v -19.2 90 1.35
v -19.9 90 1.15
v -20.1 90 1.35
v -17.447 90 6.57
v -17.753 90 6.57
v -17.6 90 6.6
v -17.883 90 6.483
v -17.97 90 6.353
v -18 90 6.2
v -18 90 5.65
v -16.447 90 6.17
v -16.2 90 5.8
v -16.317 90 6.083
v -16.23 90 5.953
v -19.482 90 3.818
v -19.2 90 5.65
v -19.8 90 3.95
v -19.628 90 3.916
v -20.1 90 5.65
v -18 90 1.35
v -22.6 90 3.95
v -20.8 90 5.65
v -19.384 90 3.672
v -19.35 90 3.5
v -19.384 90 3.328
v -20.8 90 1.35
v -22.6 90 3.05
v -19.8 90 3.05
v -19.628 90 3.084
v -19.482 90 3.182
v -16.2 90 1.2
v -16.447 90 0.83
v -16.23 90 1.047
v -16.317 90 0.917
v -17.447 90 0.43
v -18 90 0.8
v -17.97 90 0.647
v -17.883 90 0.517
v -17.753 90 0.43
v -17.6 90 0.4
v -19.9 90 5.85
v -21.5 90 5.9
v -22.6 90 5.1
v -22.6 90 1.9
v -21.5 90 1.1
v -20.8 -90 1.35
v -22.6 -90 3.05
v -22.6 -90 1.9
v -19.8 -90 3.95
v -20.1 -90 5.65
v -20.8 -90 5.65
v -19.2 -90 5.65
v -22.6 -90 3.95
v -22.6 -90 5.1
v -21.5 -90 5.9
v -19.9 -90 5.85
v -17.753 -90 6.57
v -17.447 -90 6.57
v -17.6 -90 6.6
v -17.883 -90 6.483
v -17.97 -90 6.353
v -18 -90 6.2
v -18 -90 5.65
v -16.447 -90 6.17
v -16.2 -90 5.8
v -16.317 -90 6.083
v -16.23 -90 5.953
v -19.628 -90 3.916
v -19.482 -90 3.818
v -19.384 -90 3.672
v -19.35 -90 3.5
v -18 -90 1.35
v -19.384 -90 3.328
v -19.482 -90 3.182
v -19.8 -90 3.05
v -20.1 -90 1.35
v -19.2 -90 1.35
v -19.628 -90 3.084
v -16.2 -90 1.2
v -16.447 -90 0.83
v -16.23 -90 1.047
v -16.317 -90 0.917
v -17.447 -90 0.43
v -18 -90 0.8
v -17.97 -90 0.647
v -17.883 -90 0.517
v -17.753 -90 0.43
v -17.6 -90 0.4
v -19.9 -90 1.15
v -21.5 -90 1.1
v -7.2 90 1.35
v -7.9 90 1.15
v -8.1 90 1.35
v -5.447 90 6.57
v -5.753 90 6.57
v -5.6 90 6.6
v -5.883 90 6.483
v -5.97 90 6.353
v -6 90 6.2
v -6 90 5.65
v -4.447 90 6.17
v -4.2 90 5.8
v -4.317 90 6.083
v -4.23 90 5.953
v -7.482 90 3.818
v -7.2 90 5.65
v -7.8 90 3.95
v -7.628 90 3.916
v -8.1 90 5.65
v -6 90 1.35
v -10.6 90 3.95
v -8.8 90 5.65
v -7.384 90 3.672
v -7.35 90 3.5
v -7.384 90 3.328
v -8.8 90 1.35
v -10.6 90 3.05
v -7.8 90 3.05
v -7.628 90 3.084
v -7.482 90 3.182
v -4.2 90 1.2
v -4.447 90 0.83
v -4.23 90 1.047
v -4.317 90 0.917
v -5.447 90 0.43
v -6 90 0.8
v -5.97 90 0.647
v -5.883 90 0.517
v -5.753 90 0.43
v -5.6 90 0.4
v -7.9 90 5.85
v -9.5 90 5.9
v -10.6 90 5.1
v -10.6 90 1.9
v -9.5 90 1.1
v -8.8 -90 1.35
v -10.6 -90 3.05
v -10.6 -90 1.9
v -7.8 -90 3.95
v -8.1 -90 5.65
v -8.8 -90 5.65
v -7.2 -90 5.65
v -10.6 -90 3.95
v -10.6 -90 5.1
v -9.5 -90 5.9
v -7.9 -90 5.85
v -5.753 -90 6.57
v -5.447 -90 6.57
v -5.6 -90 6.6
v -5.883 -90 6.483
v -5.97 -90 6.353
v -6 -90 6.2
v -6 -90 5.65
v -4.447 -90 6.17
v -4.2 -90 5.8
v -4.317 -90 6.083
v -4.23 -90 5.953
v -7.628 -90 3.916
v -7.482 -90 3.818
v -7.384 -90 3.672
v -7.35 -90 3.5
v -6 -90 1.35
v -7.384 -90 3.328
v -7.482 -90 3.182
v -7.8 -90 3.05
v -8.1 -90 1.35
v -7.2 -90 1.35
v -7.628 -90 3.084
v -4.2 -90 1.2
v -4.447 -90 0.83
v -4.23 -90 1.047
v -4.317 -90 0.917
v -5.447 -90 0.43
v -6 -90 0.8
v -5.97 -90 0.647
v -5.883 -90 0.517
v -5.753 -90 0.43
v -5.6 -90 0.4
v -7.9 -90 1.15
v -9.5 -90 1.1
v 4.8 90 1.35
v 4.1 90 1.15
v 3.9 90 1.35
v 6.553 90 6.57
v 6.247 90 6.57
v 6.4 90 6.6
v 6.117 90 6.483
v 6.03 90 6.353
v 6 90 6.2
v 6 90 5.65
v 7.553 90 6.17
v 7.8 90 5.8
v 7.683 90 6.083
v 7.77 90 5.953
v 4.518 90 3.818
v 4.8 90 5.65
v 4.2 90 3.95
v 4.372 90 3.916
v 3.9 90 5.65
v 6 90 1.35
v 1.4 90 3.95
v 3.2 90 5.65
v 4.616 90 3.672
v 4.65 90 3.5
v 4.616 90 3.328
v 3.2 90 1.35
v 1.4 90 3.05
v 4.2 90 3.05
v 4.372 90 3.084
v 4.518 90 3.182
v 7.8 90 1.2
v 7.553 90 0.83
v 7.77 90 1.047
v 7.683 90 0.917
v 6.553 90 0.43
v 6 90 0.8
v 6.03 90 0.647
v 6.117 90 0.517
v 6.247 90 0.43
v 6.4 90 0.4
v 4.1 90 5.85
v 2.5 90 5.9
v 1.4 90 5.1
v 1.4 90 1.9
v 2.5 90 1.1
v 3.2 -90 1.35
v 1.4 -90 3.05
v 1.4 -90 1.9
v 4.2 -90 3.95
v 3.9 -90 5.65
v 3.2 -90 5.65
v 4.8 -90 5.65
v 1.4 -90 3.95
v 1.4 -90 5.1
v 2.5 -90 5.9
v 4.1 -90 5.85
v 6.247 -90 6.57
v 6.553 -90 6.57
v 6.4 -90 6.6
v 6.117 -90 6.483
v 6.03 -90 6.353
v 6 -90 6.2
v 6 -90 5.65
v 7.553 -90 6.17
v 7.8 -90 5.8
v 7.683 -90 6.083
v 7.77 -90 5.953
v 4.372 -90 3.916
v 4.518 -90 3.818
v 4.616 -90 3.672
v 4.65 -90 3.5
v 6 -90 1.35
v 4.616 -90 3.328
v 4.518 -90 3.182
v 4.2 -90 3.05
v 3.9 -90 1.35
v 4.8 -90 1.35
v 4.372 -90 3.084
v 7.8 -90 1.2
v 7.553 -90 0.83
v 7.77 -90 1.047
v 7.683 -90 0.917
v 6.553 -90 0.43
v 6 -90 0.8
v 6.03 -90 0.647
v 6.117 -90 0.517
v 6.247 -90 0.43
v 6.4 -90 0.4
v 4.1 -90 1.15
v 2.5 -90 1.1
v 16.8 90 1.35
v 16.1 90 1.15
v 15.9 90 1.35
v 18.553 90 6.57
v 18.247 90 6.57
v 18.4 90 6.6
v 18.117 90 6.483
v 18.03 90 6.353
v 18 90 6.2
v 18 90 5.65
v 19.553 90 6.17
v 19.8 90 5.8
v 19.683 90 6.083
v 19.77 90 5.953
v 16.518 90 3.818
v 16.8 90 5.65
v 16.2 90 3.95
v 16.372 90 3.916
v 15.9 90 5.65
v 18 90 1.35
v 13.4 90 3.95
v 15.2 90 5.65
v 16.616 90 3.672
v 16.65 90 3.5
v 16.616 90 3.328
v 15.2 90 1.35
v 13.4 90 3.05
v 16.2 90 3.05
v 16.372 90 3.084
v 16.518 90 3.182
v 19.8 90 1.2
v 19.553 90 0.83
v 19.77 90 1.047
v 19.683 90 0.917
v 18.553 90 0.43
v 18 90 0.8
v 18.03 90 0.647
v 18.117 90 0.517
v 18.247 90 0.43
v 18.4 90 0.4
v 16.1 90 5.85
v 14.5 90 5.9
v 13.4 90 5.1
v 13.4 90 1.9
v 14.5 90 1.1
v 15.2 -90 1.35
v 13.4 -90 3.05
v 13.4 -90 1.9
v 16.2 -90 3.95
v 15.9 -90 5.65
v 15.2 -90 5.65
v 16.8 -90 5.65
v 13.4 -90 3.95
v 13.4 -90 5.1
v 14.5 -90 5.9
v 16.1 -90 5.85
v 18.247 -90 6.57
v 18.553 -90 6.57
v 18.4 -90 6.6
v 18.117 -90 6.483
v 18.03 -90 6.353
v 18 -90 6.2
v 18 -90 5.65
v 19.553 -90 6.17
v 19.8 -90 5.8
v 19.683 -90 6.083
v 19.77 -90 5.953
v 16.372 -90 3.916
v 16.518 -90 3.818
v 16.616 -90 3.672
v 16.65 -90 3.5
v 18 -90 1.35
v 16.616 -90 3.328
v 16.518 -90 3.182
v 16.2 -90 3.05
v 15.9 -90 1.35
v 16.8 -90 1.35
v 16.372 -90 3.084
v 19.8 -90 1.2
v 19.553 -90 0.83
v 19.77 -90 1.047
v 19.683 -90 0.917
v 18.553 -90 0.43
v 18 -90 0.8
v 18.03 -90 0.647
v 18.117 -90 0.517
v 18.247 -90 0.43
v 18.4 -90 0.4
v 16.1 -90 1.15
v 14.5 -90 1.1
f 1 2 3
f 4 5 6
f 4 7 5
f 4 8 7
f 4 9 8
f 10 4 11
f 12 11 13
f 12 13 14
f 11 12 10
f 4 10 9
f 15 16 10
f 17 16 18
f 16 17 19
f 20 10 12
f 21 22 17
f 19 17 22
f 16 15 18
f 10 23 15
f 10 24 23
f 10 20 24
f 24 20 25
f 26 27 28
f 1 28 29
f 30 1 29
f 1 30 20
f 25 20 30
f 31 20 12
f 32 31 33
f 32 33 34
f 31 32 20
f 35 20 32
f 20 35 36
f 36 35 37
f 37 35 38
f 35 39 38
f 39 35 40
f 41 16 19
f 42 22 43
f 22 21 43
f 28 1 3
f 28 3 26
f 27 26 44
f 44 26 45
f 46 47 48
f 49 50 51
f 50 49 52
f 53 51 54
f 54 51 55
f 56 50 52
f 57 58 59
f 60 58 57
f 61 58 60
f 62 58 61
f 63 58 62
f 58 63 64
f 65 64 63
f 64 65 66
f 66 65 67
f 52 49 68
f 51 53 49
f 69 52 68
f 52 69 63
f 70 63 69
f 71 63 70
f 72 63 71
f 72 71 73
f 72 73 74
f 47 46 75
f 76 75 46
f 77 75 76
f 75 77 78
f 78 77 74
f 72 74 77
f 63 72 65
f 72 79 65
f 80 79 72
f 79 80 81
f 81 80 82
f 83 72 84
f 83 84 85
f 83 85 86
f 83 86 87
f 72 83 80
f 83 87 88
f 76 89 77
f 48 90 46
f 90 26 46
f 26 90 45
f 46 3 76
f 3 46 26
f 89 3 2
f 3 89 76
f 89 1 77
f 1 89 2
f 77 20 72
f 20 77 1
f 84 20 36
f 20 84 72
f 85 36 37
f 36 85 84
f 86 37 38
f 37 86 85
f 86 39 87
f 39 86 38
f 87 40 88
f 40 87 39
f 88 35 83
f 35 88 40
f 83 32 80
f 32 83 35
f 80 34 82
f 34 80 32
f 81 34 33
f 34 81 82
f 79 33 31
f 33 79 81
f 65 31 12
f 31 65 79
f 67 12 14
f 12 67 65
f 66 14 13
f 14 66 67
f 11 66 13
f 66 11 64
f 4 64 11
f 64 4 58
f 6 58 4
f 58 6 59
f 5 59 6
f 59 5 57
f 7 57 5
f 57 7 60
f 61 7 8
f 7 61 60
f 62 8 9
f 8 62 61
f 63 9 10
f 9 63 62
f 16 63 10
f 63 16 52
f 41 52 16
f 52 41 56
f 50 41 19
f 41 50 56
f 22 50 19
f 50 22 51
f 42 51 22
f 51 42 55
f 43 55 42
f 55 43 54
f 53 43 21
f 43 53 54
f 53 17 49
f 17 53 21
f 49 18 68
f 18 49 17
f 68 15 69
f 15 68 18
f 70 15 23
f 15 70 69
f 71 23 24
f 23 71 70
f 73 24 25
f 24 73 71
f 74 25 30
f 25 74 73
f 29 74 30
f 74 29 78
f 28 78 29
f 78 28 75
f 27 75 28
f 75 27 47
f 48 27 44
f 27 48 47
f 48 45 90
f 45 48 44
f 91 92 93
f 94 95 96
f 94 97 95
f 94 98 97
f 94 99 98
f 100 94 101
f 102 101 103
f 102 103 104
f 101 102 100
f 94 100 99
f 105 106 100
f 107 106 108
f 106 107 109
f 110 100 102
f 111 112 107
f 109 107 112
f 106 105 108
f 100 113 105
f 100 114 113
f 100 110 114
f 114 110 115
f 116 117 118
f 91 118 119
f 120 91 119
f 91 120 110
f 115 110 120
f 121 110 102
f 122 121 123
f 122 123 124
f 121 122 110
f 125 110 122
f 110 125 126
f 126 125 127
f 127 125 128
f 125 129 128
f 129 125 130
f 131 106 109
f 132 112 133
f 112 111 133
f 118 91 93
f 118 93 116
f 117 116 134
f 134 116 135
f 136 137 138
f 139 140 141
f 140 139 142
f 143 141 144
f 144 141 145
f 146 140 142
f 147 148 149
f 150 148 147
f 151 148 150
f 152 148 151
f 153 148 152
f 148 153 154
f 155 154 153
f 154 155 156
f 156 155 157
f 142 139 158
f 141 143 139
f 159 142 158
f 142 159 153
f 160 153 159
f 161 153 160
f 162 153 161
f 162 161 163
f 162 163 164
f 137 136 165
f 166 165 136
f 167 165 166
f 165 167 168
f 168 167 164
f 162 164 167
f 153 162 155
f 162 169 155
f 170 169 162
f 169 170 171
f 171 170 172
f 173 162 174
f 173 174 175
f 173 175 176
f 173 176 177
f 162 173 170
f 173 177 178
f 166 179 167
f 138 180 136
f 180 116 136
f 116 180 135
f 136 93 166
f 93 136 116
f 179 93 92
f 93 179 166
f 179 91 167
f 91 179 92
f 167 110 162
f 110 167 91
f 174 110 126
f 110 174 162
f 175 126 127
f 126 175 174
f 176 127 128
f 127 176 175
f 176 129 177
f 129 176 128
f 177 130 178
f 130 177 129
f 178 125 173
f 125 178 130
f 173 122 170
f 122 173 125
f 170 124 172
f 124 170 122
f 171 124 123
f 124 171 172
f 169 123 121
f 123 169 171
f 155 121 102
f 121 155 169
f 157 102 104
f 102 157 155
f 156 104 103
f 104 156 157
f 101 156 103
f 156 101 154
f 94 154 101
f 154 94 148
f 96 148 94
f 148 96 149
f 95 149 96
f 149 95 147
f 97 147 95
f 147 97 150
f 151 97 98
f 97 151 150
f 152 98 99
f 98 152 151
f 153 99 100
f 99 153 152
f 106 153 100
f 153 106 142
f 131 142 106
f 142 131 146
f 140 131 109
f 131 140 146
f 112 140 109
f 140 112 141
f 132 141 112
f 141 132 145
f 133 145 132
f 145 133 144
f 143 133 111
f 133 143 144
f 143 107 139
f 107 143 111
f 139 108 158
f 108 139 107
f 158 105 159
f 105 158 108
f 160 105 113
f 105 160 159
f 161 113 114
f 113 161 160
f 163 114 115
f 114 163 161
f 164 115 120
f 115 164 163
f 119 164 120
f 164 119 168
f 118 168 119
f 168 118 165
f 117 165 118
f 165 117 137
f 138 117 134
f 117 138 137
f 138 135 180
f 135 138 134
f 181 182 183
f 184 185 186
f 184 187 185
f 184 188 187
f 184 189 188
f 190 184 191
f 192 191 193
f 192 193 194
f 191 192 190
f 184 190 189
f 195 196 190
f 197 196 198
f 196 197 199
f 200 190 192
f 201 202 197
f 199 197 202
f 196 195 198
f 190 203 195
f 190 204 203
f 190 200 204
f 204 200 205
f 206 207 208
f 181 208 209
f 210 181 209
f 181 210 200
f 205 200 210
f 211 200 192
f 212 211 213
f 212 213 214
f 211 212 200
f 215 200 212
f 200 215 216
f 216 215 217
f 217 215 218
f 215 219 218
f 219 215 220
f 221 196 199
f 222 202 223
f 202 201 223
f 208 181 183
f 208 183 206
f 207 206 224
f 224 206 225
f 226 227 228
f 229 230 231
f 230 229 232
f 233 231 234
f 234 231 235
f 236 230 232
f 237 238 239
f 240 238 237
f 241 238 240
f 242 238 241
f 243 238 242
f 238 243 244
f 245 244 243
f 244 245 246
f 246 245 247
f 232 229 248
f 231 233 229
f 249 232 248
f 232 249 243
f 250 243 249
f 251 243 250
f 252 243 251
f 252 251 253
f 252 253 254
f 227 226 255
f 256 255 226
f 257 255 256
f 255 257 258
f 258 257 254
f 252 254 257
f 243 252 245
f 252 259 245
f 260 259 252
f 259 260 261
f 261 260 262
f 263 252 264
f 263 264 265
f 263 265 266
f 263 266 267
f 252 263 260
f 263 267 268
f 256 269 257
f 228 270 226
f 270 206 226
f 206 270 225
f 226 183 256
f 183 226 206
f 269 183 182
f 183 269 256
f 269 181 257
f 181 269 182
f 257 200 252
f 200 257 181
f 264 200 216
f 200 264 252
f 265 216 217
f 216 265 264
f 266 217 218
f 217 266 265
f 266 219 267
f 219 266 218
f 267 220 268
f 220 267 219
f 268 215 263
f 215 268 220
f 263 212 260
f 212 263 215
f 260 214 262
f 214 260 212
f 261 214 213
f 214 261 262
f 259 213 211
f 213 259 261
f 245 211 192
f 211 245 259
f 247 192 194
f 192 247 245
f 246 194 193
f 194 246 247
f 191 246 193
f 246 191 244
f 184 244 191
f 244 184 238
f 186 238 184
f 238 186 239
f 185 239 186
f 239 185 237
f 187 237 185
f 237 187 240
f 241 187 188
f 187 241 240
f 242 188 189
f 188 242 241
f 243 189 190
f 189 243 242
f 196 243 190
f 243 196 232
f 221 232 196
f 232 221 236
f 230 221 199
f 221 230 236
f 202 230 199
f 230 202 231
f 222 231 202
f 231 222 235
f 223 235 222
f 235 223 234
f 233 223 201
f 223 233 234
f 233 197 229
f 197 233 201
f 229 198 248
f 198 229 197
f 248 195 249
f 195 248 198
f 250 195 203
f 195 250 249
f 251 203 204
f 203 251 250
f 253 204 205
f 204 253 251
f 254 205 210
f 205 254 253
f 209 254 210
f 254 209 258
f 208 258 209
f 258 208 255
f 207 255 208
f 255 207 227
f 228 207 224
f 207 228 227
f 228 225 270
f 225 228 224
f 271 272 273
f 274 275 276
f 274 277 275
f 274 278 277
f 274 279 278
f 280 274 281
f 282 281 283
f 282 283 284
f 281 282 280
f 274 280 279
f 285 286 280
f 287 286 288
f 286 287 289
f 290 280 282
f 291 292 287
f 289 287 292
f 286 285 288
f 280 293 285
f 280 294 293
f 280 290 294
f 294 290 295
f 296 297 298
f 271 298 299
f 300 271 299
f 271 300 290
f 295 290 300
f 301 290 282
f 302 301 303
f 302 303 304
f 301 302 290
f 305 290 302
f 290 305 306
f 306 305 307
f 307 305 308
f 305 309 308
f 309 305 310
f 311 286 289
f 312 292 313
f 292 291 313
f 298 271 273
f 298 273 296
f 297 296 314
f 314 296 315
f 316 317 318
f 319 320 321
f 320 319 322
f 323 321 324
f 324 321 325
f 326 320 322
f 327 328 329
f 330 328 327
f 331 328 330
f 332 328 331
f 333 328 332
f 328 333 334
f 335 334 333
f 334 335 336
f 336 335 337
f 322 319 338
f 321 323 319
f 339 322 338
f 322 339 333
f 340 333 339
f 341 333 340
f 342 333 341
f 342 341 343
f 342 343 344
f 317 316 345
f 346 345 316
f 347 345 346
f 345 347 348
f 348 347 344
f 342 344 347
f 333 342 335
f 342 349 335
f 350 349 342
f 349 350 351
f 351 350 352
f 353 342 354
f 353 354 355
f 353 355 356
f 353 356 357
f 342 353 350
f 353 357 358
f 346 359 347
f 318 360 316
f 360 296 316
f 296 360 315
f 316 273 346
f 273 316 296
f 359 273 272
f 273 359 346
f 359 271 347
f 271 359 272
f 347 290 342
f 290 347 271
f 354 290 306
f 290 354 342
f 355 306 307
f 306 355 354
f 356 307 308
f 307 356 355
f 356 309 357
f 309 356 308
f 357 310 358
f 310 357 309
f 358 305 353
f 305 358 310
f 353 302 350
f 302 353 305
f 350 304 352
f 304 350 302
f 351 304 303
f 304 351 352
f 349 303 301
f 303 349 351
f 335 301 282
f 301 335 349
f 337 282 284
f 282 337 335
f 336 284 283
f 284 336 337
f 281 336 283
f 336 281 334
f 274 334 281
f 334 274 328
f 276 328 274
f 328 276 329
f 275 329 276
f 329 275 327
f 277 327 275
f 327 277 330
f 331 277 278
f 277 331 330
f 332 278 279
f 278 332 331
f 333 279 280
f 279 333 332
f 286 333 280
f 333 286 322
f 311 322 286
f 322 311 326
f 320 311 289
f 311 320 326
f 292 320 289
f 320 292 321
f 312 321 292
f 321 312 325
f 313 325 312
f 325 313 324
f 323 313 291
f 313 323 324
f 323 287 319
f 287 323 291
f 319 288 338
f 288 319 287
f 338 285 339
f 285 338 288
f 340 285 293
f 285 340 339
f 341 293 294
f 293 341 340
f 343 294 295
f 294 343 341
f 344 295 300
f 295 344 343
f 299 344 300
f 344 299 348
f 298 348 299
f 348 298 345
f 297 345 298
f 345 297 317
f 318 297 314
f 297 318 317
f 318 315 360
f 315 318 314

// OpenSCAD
// file: ../modules/spline_profile.scad
// ====================================================================
// Cellophane Spline Groove & Compliant Spring Clamping Strip Module
// High-tension retention system with compliant split-core spring prongs
// and directional grip teeth to hold cellophane drum-tight without slipping
// ====================================================================
include <../config.scad>

// Negative volume for cutting the spline groove into any beam surface
// Cuts into the -Z direction from Z=0.
// Axis parameter: "Y" (default) or "X"
module spline_groove_negative(length = 100, axis = "Y") {
    gw = GROOVE_WIDTH; // 4.5 mm
    gd = GROOVE_DEPTH; // 5.0 mm
    
    // Cross-section profile of the groove (in X-Z plane)
    // Features a 45° lead-in chamfer at the mouth and internal retention undercuts
    module groove_cross_section_2d() {
        polygon(points = [
            [-(gw/2 + 0.6),  0.05], // Mouth chamfer outer left
            [-gw/2,         -0.80], // Mouth chamfer inner left
            [-gw/2 - 0.15,  -2.50], // Mid retention undercut left
            [-gw/2,         -gd],   // Bottom left
            [ gw/2,         -gd],   // Bottom right
            [ gw/2 + 0.15,  -2.50], // Mid retention undercut right
            [ gw/2,         -0.80], // Mouth chamfer inner right
            [ (gw/2 + 0.6),  0.05]  // Mouth chamfer outer right
        ]);
    }
    
    if (axis == "Y") {
        rotate([90, 0, 0])
        linear_extrude(height = length, center = true) {
            groove_cross_section_2d();
        }
    } else {
        rotate([0, 90, 0])
        rotate([0, 0, 90])
        linear_extrude(height = length, center = true) {
            groove_cross_section_2d();
        }
    }
}

// 2D Profile of the Compliant Spring-Wedge Spline Clip (X-Z plane)
// Has a central vertical expansion slot that allows the two prongs to flex inward
// during insertion and exert continuous outward spring pressure against the cellophane.
module spline_clip_profile_2d(width_offset = 0) {
    w_cap   = 7.0; // Top thumb-press cap width
    h_cap   = 1.8; // Cap thickness
    h_depth = 4.6; // Insertion depth
    
    // Base dimensions + user/grip offset
    w_shaft = 4.3 + width_offset; // Base shaft (tight fit in 4.5mm groove)
    w_barb1 = 4.7 + width_offset; // Upper retention barb (interferes with groove)
    w_barb2 = 4.8 + width_offset; // Lower primary clamping barb
    w_nose  = 3.2;                // Lead-in nose
    
    difference() {
        union() {
            // 1. Top Thumb-Press Cap (acts as depth stop & pry lip)
            translate([0, h_cap / 2])
            hull() {
                translate([-w_cap/2 + 0.8, -h_cap/2 + 0.4]) circle(r = 0.4, $fn=16);
                translate([ w_cap/2 - 0.8, -h_cap/2 + 0.4]) circle(r = 0.4, $fn=16);
                translate([-w_cap/2 + 1.2,  h_cap/2 - 0.4]) circle(r = 0.4, $fn=16);
                translate([ w_cap/2 - 1.2,  h_cap/2 - 0.4]) circle(r = 0.4, $fn=16);
            }
            
            // 2. Dual-Barb Clamping Prongs
            polygon(points = [
                [-w_shaft/2,        0.0],
                [-w_shaft/2,       -1.2],
                [-w_barb1/2,       -1.9], // Upper barb tooth
                [-w_shaft/2,       -2.1],
                [-w_shaft/2,       -2.8],
                [-w_barb2/2,       -3.5], // Lower primary clamping tooth
                [-w_nose/2,        -h_depth], // Tapered nose
                [ w_nose/2,        -h_depth],
                [ w_barb2/2,       -3.5],
                [ w_shaft/2,       -2.8],
                [ w_shaft/2,       -2.1],
                [ w_barb1/2,       -1.9],
                [ w_shaft/2,       -1.2],
                [ w_shaft/2,        0.0]
            ]);
        }
        
        // 3. Central Vertical Expansion Kerf (0.9 mm compliant flex slot)
        // Splits the shaft into two spring prongs that flex inward upon insertion
        translate([0, -h_depth/2 - 0.6])
        hull() {
            translate([0,  h_depth/2 - 1.2]) circle(r = 0.45, $fn=16);
            translate([0, -h_depth/2 + 0.5]) circle(r = 0.45, $fn=16);
        }
    }
}

// 3D Snap-in Locking Spline Clip (oriented along Y axis by default)
module spline_clip(length = 150, axis = "Y", width_offset = 0) {
    if (axis == "Y") {
        rotate([90, 0, 0])
        linear_extrude(height = length, center = true) {
            spline_clip_profile_2d(width_offset = width_offset);
        }
    } else {
        rotate([0, 90, 0])
        rotate([0, 0, 90])
        linear_extrude(height = length, center = true) {
            spline_clip_profile_2d(width_offset = width_offset);
        }
    }
}
// file: ../config.scad
// ====================================================================
// Bambu Lab A1 Enclosure - Global Configuration Parameters
// Ultra-Minimal 8-Part Modular Kit (Face-Overlay Architecture)
// ====================================================================

// --- Print Bed Limits ---
MAX_PRINT_X = 256;
MAX_PRINT_Y = 256;
MAX_PRINT_Z = 256;
SAFE_PART_MAX_LEN = 240; // Conservative safety margin for brims

// --- Internal Enclosure Dimensions (mm) ---
// Sized for Bambu Lab A1 bed-slinger travel, right poop bucket, and top BMCU 370c
INTERNAL_WIDTH  = 560; // X axis clearance (A1 + toolhead + right poop bucket)
INTERNAL_DEPTH  = 580; // Y axis clearance (Bed travel + rear cable loop buffer)
INTERNAL_HEIGHT = 710; // Z axis clearance (Gantry + BMCU 370c rotating mount + spool)

// --- Standardized Modular Grid Lengths ---
FRAME_EDGE_LEN  = 185.0; // Standardized length for ALL frame edge segments
DOOR_EDGE_LEN   = 138.0; // Standardized length for ALL door/roof edge segments

// --- Frame Profile Dimensions ---
BEAM_WIDTH   = 24.0;  // Frame beam width X/Y (mm)
BEAM_HEIGHT  = 24.0;  // Frame beam height Z (mm)
CORNER_SIZE  = 36.0;  // 3-way cubic corner junction dimension

// --- Door Profile Dimensions (Slim Face-Overlay) ---
DOOR_PROFILE_W = 18.0; // Width across door frame face (mm)
DOOR_PROFILE_T = 16.0; // Thickness of door frame (mm)
DOOR_CORNER_W  = 25.0; // L-shaped door corner block dimension (mm)

// --- Tolerances (FDM 3D Printing tuned for Bambu Lab A1 0.4mm nozzle) ---
TOL_TIGHT    = 0.15; // Tight press fit (spline clips)
TOL_DOVETAIL = 0.20; // Sliding interlock fit (wedge dovetails)
TOL_HINGE    = 0.30; // Free rotating hinge pins
TOL_LOOSE    = 0.40; // Clearance gaps

// --- Cellophane Spline Groove Specifications ---
GROOVE_WIDTH  = 4.5; // Width of U-channel
GROOVE_DEPTH  = 5.0; // Depth of U-channel

// --- Peg-Free Dual-Taper Wedge Dovetail Dimensions ---
DOVETAIL_DEPTH = 15.0; // Length of wedge insert (mm)

// Main Frame Wedge Dovetail
FRAME_BOT_ROOT = 7.5;  // Bottom root width (narrow entry)
FRAME_BOT_TIP  = 13.5; // Bottom tip width
FRAME_TOP_ROOT = 9.5;  // Top root width (wide wedge lock)
FRAME_TOP_TIP  = 16.5; // Top tip width

// Mini Door Wedge Dovetail (scaled for 18x16 mm door profile)
DOOR_BOT_ROOT  = 5.5;
DOOR_BOT_TIP   = 9.5;
DOOR_TOP_ROOT  = 7.0;
DOOR_TOP_TIP   = 12.0;
DOOR_DEPTH     = 10.0;

// --- Filament PTFE Tube Routing (Bottom Side Beam) ---
PTFE_TUBE_OD  = 4.0; // Standard PTFE bowden tube outer diameter (mm)
PTFE_HOLE_DIA = 4.3; // Slip-fit through-hole diameter with retention grip
PTFE_TUBE_CNT = 4;   // 4 dedicated filament tubes for multi-material / drybox
PTFE_ANGLE    = 35;  // Upward angle toward toolhead/BMCU (degrees)

// --- Render Quality ($fn) ---
$fn = $preview ? 24 : 64;
// main file
// ====================================================================
// 9. Snap-in Spring Spline Clips (Part 9)
// Compliant split-core spring clamp with dual sawtooth barb teeth
// Pre-sized for standardized frame edges (180 mm) and door edges (135 mm)
// ====================================================================
include <../config.scad>
use <../modules/spline_profile.scad>

// Pre-sized clips for standard edges
module spline_clip_frame() {
    spline_clip(length = FRAME_EDGE_LEN - 5, axis = "Y");
}

module spline_clip_door() {
    spline_clip(length = DOOR_EDGE_LEN - 5, axis = "Y");
}

// Print bed batch plate (4 clips laid flat on bed at Z=0)
module spline_clip_batch(count = 4, length = 180) {
    for (i = [0 : count - 1]) {
        translate([i * 12 - ((count-1)*12)/2, 0, 3.5])
        rotate([0, 90, 0])
        spline_clip(length = length, axis = "Y");
    }
}

// Default preview: 4 frame clips
spline_clip_batch();
